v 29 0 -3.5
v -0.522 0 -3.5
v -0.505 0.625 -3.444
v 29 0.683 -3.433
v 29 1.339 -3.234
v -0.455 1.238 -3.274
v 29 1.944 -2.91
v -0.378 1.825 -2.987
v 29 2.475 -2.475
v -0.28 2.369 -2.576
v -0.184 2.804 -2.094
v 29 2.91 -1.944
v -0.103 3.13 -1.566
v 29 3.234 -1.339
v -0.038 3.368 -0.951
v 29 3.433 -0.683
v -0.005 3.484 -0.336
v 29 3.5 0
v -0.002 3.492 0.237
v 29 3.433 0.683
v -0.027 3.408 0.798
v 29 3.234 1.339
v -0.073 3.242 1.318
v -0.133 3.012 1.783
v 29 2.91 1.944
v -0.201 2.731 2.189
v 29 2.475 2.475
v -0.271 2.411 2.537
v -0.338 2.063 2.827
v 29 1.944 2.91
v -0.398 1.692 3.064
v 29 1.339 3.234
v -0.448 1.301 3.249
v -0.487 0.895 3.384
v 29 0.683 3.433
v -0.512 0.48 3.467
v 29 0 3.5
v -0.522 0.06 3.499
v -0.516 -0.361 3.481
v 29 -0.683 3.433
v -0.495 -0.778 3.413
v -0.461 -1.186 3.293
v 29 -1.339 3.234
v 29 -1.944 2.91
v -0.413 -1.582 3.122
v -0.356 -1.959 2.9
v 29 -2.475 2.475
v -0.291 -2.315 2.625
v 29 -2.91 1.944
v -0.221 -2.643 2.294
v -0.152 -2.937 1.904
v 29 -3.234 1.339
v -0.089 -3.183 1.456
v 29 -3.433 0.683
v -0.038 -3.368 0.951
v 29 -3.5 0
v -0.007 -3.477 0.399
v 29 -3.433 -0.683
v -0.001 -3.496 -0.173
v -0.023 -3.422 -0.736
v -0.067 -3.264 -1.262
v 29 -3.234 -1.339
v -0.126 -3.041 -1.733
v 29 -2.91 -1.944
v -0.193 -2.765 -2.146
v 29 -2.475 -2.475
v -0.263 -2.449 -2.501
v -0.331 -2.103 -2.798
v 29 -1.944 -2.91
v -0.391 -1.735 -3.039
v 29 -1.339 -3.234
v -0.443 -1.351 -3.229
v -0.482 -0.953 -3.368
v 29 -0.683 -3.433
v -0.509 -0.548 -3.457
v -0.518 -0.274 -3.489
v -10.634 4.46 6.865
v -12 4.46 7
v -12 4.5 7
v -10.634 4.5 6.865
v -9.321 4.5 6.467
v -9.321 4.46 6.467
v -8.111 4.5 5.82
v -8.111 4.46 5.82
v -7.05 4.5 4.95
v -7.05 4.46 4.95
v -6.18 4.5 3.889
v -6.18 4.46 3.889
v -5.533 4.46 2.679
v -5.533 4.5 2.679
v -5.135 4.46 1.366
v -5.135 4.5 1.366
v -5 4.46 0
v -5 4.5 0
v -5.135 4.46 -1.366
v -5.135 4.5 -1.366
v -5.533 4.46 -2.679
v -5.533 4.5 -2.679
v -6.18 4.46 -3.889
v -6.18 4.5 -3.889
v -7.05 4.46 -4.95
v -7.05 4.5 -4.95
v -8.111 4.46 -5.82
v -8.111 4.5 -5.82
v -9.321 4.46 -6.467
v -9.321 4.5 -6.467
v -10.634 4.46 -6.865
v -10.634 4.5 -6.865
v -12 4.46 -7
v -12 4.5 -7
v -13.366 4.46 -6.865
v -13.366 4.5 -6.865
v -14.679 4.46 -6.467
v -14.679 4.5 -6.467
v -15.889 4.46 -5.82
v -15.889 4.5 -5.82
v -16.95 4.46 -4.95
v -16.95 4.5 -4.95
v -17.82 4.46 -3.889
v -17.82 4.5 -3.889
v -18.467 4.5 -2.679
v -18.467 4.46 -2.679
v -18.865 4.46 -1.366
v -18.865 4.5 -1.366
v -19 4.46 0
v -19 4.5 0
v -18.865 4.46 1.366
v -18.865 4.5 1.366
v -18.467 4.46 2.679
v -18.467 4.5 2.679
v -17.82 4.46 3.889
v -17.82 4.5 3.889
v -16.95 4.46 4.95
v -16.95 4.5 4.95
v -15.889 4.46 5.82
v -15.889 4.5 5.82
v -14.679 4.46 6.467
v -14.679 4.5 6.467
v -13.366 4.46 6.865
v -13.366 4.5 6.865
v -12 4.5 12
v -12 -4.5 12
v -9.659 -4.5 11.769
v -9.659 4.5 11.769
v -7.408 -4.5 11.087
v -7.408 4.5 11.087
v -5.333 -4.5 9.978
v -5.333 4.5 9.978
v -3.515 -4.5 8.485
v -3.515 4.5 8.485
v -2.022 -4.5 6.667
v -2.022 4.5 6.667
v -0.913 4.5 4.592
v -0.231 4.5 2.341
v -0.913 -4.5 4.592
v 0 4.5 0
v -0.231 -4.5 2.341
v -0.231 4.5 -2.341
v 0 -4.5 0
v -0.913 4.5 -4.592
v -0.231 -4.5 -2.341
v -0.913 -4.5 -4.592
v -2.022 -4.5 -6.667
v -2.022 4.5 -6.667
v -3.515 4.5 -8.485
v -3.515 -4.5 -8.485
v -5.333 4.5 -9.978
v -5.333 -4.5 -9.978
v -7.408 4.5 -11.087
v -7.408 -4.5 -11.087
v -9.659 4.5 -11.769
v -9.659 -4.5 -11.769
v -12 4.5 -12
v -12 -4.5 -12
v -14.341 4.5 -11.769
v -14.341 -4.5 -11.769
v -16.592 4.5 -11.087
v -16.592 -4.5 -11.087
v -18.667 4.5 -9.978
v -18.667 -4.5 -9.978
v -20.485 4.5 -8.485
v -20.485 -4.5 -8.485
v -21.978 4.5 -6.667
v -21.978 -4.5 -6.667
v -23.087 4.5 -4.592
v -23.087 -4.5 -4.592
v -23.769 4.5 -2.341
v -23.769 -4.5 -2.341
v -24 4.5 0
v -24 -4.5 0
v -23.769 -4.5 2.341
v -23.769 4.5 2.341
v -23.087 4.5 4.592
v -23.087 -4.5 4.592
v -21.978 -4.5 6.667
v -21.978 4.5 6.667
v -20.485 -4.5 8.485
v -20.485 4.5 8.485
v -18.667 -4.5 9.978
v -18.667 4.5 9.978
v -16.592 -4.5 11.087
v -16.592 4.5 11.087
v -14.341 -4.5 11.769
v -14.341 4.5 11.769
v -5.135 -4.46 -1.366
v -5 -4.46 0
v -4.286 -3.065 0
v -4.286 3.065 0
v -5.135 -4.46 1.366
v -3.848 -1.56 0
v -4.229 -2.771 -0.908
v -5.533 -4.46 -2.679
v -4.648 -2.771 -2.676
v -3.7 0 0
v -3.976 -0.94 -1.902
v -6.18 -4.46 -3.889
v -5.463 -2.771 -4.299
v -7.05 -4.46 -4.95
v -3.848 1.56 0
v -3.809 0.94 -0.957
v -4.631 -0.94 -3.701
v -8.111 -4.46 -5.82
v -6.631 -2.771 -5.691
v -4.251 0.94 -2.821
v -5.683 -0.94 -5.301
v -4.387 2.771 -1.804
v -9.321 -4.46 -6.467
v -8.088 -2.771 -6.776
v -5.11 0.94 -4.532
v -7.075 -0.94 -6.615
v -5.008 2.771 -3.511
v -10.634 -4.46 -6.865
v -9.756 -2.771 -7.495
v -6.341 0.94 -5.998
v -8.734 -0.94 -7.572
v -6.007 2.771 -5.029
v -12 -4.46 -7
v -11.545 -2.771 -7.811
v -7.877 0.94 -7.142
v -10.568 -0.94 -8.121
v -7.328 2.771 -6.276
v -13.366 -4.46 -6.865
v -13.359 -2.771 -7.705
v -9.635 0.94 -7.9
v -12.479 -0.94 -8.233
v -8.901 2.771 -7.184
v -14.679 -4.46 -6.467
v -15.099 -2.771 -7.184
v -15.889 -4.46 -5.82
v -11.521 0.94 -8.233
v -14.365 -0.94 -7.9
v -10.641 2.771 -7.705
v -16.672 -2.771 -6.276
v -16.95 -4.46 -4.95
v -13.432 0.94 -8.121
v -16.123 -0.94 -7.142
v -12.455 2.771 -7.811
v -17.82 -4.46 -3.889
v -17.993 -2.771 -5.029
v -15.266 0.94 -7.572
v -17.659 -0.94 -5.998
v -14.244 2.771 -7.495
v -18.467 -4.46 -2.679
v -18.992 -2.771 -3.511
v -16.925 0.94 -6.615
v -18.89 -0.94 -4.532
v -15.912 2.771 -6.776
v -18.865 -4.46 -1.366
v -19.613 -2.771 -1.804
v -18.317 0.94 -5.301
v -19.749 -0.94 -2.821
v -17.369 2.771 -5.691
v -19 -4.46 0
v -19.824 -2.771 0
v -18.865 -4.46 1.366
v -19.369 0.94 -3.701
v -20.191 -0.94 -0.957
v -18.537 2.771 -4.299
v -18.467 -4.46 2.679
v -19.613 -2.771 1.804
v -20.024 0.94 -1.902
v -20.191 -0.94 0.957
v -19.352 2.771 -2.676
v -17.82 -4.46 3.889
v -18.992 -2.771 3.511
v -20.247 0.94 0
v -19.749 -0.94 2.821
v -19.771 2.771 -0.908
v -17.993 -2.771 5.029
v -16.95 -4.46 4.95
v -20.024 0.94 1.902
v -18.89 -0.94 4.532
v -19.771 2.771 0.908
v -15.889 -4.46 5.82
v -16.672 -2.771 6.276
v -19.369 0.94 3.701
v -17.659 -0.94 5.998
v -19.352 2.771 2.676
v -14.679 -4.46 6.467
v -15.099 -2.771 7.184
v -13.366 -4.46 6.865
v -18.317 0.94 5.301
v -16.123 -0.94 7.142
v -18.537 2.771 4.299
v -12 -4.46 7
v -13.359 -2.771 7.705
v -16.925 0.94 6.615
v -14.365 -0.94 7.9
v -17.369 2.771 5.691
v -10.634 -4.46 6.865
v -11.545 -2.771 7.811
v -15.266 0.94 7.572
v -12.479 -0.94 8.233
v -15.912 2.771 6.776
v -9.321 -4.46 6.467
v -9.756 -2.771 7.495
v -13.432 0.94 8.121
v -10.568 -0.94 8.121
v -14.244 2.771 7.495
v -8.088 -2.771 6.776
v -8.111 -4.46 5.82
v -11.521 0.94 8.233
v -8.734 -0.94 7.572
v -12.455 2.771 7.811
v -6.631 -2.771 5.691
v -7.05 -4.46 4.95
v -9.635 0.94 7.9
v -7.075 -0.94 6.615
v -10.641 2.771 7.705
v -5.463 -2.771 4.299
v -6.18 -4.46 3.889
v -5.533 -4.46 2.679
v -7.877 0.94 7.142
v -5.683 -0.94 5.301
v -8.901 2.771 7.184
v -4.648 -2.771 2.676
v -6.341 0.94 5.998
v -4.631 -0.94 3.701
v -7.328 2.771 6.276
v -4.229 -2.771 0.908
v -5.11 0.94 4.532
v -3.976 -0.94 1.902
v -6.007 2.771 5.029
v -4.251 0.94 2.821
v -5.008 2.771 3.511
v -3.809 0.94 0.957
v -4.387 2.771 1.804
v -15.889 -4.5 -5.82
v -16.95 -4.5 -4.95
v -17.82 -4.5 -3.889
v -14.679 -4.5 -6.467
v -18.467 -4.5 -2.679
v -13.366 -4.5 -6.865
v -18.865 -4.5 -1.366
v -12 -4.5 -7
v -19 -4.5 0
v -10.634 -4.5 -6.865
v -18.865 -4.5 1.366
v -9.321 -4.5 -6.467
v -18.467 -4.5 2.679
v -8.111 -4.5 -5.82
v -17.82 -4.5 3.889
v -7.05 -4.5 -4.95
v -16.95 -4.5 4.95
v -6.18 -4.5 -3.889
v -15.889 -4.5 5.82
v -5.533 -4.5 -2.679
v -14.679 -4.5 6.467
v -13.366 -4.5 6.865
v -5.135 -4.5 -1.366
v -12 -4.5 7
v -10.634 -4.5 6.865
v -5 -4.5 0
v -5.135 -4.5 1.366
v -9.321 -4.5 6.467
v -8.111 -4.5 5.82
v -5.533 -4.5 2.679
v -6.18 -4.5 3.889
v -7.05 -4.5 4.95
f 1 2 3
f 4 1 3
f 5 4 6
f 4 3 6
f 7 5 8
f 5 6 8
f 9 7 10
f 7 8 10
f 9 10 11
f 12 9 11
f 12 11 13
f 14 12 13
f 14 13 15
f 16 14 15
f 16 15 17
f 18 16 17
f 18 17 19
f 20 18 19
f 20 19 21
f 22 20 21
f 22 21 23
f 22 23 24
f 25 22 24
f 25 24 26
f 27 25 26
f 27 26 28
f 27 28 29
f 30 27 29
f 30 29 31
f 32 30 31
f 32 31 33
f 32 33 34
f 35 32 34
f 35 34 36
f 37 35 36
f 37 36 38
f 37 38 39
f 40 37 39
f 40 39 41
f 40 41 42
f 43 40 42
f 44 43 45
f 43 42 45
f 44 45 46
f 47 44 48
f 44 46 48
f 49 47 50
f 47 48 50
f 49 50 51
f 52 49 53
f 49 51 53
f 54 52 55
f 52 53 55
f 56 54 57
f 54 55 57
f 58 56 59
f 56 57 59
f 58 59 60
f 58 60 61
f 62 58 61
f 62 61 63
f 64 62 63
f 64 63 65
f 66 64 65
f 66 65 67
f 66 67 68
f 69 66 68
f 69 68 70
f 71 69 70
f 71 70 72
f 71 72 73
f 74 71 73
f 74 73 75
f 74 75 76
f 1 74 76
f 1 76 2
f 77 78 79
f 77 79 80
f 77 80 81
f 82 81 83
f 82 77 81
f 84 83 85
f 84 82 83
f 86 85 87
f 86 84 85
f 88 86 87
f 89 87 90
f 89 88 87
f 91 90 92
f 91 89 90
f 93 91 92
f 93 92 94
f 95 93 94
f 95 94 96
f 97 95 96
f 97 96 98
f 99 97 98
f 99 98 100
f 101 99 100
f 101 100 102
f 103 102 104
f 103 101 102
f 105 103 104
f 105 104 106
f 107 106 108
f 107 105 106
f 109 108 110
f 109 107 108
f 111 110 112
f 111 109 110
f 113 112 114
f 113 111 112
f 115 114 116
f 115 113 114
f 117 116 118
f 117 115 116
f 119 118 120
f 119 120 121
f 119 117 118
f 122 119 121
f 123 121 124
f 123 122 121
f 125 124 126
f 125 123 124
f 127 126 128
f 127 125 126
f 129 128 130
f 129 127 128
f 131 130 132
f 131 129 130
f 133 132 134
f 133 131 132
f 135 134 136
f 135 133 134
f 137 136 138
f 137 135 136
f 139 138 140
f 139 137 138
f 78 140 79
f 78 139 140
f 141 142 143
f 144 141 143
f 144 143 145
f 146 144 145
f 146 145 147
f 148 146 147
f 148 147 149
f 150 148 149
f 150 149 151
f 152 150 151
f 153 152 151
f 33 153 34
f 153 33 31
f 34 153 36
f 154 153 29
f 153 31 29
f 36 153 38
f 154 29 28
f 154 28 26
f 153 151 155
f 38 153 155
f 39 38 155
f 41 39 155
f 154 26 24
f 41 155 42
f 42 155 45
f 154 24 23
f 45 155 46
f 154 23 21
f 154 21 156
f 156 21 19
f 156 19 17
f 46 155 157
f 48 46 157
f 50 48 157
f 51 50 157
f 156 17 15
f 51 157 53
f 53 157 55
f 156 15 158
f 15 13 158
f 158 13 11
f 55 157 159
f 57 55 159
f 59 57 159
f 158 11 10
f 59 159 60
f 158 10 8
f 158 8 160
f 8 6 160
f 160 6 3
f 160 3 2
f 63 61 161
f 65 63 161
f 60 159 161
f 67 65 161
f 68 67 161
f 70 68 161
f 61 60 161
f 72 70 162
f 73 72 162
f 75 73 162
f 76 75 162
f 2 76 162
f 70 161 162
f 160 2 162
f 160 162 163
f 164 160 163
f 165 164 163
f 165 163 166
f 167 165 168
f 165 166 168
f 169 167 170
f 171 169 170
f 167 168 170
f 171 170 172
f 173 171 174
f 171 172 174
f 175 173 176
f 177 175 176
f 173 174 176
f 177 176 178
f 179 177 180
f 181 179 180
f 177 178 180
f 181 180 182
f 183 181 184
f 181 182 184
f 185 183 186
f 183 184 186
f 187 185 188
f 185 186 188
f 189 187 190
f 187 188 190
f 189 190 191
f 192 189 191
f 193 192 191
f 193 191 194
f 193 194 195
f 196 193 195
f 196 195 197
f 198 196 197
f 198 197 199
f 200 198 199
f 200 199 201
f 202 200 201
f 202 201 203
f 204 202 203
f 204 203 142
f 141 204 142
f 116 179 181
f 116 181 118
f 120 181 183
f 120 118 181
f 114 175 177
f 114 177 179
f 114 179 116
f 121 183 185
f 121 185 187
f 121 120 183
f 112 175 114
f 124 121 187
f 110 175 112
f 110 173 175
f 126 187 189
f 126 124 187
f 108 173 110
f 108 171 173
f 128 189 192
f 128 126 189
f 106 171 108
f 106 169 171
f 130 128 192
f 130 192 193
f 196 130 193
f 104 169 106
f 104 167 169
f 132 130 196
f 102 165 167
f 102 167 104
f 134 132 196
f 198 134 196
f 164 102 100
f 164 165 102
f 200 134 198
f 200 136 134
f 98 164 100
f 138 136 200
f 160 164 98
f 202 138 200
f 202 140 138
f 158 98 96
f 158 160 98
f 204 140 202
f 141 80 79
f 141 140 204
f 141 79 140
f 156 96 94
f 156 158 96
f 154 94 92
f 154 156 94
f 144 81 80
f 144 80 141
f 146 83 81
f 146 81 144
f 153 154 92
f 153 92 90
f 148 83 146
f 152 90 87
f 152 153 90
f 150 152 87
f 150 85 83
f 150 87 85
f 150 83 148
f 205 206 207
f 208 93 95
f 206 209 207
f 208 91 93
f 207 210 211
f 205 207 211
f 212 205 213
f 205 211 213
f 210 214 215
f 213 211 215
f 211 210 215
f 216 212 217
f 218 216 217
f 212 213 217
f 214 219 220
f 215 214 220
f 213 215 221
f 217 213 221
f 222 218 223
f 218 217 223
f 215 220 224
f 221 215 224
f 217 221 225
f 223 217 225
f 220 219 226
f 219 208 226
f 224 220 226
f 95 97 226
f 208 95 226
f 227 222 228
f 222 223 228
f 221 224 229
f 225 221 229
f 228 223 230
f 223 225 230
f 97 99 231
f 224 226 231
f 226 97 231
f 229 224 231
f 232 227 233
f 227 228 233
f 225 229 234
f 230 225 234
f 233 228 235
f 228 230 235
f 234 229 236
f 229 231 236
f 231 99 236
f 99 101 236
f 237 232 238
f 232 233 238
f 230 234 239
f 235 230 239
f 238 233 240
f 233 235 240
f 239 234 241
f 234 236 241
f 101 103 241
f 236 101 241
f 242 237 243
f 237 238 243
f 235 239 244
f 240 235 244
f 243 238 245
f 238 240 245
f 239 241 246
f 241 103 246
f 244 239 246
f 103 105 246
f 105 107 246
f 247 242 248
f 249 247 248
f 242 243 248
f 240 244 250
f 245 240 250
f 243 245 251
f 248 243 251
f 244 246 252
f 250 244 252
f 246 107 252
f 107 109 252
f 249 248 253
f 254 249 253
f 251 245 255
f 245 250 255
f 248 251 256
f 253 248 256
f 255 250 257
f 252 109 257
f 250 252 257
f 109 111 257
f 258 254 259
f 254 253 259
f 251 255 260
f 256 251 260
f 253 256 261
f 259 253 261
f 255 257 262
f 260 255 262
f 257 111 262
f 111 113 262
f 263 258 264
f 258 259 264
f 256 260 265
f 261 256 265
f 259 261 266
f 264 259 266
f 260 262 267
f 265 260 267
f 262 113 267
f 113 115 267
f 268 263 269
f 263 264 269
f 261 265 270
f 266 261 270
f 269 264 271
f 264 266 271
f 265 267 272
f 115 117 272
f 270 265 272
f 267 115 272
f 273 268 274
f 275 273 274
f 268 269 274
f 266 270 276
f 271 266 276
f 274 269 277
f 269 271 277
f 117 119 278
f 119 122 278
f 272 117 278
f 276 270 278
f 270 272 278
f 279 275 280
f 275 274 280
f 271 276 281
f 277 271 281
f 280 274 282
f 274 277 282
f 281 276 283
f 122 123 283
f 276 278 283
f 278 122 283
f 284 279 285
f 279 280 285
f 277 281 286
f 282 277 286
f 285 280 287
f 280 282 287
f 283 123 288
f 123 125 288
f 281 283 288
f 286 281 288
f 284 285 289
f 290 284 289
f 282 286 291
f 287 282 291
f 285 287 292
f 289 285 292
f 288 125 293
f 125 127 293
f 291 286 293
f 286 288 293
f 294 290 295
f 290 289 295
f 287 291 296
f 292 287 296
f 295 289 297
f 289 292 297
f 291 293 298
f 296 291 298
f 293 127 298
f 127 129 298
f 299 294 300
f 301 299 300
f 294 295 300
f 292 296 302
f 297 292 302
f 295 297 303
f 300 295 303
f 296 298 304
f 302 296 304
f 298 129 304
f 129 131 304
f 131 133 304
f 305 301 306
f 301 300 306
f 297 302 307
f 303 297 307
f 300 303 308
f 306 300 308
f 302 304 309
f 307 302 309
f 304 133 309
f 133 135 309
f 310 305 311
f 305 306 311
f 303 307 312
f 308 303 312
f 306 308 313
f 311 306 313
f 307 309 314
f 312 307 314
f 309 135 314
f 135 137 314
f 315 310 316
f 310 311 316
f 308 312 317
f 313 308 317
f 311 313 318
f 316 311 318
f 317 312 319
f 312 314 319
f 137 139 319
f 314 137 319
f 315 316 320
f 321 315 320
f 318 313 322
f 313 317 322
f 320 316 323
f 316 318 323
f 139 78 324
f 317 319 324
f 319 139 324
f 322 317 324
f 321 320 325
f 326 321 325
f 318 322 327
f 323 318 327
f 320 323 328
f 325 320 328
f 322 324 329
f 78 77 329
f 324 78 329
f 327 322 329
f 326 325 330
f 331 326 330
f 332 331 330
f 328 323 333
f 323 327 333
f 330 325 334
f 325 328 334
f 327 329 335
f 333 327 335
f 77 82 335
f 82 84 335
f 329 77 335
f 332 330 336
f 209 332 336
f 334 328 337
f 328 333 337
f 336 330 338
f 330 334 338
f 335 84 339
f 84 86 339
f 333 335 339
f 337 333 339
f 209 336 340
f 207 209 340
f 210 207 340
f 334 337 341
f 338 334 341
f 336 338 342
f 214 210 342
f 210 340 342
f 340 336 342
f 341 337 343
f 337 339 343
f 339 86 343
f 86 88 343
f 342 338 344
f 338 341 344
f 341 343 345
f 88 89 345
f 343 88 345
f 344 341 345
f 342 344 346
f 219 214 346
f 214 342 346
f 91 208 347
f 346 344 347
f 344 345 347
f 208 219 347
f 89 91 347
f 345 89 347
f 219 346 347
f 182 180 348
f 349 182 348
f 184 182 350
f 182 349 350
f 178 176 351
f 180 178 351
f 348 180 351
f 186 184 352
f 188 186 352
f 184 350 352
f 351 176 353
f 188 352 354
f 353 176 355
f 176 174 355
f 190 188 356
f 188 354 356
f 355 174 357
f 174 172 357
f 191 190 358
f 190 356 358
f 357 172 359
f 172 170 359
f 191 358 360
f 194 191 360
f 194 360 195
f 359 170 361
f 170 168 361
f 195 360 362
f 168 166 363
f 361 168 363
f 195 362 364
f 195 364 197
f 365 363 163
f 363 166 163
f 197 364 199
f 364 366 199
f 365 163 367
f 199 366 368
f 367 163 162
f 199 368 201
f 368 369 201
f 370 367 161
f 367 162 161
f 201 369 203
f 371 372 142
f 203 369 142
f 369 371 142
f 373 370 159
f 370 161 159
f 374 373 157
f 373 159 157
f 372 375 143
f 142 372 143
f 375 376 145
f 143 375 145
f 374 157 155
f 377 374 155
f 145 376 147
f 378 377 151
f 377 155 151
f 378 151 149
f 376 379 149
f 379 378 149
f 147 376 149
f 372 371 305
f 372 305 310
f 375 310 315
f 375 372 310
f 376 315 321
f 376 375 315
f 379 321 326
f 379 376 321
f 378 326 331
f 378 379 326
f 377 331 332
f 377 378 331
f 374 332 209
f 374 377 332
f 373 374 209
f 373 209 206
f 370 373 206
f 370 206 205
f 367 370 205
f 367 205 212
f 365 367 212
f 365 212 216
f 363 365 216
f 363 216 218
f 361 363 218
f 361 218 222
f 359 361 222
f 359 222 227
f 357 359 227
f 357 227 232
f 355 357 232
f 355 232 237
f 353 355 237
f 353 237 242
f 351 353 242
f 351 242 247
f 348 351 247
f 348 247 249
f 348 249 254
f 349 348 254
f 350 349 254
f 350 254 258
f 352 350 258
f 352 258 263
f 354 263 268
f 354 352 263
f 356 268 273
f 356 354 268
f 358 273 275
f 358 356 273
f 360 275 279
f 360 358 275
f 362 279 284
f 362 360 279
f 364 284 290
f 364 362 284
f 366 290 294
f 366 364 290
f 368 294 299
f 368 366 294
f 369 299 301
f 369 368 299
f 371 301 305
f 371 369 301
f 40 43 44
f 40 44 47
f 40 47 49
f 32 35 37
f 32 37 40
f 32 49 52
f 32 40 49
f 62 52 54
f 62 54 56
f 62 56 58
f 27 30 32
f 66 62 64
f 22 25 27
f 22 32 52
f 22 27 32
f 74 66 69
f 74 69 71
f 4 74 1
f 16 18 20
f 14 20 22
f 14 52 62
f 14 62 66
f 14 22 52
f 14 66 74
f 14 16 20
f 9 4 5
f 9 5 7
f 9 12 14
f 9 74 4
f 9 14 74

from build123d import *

# Parameters (mm, degrees)
BOSS_EXTRUDE2_DEPTH      = 29
BOSS_EXTRUDE2_DEPTH_BACK = 2
SKETCH1_R                = 3.5
BOSS_EXTRUDE3_DEPTH      = 4.5
BOSS_EXTRUDE3_DEPTH_BACK = 4.5
SKETCH2_R                = 12
SKETCH2_R_2              = 7


# Read off the part's stored shape, not the designer's step: Cut-Revolve-Thin4
with BuildPart() as part:
    # Sketch1 → Boss-Extrude2 (new, two sides: drawn at the far end of the back side and taken through both)
    with BuildSketch(Plane.YZ.offset(-BOSS_EXTRUDE2_DEPTH_BACK)):
        with Locations(Location((0, 0, 0), (0, 0, 270))):
            Circle(SKETCH1_R)
    extrude(amount=BOSS_EXTRUDE2_DEPTH + BOSS_EXTRUDE2_DEPTH_BACK)

    # Sketch2 → Boss-Extrude3 (add, two sides: drawn at the far end of the back side and taken through both)
    with BuildSketch(Plane(origin=(0, 0, 0), x_dir=(-1, 0, 0), z_dir=(0, 1, 0)).offset(-BOSS_EXTRUDE3_DEPTH_BACK)):
        with Locations(Location((12, 0, 0), (0, 0, 90))):
            Circle(SKETCH2_R)
        with Locations(Location((12, 0, 0), (0, 0, 90))):
            Circle(SKETCH2_R_2, mode=Mode.SUBTRACT)
    extrude(amount=BOSS_EXTRUDE3_DEPTH + BOSS_EXTRUDE3_DEPTH_BACK)

    # Cut-Revolve-Thin4 outline → Cut-Revolve-Thin4 (revolve, cut)
    with BuildSketch(Plane(origin=(-12, 0, 0), x_dir=(1, 0, 0), z_dir=(0, 0, 1))):
        with BuildLine():
            Line((6.999999996, 4.459820631), (6.999999996, -4.459820631))
            ThreePointArc((6.999999996, -4.459820631), (8.3, 0), (6.999999996, 4.459820631))
        make_face()
    revolve(axis=Axis((-12, 0, 0), (0, 1, 0)), mode=Mode.SUBTRACT)


solid = part.part
